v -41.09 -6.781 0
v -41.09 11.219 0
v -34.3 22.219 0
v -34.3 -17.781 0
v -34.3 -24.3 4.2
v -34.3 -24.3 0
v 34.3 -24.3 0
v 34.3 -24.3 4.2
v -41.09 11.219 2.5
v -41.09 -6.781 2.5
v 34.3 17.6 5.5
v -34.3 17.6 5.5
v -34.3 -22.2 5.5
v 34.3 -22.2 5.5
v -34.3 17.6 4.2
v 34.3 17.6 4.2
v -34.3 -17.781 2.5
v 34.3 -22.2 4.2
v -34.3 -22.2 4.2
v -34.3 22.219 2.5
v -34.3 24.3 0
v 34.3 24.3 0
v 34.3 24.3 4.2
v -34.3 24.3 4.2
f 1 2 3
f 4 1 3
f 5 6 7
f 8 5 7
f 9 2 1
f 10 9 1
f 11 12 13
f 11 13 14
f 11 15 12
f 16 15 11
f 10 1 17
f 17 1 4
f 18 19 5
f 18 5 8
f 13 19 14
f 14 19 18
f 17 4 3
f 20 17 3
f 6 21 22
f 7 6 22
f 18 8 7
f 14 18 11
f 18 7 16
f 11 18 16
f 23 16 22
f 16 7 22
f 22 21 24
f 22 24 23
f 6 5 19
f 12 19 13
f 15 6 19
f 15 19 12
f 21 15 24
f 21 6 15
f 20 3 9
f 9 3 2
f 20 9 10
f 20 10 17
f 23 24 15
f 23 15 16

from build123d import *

# Parameters (mm, degrees)
SZKIC1_W                    = 68.6
SZKIC1_H                    = 48.6
DODANIE_WYCI_GNI_CIE1_DEPTH = 4.2
SZKIC2_W                    = 68.6
SZKIC2_H                    = 39.8
DODANIE_WYCI_GNI_CIE2_DEPTH = 1.3
DODANIE_WYCI_GNI_CIE3_DEPTH = 2.5


with BuildPart() as part:
    # Szkic1 → Dodanie-wyciągnięcie1 (new body)
    with BuildSketch(Plane.XY):
        Rectangle(SZKIC1_W, SZKIC1_H)
    extrude(amount=DODANIE_WYCI_GNI_CIE1_DEPTH)

    # Szkic2 → Dodanie-wyciągnięcie2 (add)
    with BuildSketch(Plane.XY.offset(4.2)):
        with Locations((0, -2.3)):
            Rectangle(SZKIC2_W, SZKIC2_H)
    extrude(amount=DODANIE_WYCI_GNI_CIE2_DEPTH)


with BuildPart() as body_2:
    # Szkic3 → Dodanie-wyciągnięcie3 (new body)
    with BuildSketch(Plane(origin=(0, 0, 0), x_dir=(-1, 0, 0), z_dir=(0, 0, -1))):
        Polygon((34.3, 22.218863192), (41.090373398, 11.218863192), (41.090373398, -6.781136808), (34.3, -17.781136808), align=None)
    extrude(amount=-DODANIE_WYCI_GNI_CIE3_DEPTH)


solid = Compound([part.part, body_2.part])
